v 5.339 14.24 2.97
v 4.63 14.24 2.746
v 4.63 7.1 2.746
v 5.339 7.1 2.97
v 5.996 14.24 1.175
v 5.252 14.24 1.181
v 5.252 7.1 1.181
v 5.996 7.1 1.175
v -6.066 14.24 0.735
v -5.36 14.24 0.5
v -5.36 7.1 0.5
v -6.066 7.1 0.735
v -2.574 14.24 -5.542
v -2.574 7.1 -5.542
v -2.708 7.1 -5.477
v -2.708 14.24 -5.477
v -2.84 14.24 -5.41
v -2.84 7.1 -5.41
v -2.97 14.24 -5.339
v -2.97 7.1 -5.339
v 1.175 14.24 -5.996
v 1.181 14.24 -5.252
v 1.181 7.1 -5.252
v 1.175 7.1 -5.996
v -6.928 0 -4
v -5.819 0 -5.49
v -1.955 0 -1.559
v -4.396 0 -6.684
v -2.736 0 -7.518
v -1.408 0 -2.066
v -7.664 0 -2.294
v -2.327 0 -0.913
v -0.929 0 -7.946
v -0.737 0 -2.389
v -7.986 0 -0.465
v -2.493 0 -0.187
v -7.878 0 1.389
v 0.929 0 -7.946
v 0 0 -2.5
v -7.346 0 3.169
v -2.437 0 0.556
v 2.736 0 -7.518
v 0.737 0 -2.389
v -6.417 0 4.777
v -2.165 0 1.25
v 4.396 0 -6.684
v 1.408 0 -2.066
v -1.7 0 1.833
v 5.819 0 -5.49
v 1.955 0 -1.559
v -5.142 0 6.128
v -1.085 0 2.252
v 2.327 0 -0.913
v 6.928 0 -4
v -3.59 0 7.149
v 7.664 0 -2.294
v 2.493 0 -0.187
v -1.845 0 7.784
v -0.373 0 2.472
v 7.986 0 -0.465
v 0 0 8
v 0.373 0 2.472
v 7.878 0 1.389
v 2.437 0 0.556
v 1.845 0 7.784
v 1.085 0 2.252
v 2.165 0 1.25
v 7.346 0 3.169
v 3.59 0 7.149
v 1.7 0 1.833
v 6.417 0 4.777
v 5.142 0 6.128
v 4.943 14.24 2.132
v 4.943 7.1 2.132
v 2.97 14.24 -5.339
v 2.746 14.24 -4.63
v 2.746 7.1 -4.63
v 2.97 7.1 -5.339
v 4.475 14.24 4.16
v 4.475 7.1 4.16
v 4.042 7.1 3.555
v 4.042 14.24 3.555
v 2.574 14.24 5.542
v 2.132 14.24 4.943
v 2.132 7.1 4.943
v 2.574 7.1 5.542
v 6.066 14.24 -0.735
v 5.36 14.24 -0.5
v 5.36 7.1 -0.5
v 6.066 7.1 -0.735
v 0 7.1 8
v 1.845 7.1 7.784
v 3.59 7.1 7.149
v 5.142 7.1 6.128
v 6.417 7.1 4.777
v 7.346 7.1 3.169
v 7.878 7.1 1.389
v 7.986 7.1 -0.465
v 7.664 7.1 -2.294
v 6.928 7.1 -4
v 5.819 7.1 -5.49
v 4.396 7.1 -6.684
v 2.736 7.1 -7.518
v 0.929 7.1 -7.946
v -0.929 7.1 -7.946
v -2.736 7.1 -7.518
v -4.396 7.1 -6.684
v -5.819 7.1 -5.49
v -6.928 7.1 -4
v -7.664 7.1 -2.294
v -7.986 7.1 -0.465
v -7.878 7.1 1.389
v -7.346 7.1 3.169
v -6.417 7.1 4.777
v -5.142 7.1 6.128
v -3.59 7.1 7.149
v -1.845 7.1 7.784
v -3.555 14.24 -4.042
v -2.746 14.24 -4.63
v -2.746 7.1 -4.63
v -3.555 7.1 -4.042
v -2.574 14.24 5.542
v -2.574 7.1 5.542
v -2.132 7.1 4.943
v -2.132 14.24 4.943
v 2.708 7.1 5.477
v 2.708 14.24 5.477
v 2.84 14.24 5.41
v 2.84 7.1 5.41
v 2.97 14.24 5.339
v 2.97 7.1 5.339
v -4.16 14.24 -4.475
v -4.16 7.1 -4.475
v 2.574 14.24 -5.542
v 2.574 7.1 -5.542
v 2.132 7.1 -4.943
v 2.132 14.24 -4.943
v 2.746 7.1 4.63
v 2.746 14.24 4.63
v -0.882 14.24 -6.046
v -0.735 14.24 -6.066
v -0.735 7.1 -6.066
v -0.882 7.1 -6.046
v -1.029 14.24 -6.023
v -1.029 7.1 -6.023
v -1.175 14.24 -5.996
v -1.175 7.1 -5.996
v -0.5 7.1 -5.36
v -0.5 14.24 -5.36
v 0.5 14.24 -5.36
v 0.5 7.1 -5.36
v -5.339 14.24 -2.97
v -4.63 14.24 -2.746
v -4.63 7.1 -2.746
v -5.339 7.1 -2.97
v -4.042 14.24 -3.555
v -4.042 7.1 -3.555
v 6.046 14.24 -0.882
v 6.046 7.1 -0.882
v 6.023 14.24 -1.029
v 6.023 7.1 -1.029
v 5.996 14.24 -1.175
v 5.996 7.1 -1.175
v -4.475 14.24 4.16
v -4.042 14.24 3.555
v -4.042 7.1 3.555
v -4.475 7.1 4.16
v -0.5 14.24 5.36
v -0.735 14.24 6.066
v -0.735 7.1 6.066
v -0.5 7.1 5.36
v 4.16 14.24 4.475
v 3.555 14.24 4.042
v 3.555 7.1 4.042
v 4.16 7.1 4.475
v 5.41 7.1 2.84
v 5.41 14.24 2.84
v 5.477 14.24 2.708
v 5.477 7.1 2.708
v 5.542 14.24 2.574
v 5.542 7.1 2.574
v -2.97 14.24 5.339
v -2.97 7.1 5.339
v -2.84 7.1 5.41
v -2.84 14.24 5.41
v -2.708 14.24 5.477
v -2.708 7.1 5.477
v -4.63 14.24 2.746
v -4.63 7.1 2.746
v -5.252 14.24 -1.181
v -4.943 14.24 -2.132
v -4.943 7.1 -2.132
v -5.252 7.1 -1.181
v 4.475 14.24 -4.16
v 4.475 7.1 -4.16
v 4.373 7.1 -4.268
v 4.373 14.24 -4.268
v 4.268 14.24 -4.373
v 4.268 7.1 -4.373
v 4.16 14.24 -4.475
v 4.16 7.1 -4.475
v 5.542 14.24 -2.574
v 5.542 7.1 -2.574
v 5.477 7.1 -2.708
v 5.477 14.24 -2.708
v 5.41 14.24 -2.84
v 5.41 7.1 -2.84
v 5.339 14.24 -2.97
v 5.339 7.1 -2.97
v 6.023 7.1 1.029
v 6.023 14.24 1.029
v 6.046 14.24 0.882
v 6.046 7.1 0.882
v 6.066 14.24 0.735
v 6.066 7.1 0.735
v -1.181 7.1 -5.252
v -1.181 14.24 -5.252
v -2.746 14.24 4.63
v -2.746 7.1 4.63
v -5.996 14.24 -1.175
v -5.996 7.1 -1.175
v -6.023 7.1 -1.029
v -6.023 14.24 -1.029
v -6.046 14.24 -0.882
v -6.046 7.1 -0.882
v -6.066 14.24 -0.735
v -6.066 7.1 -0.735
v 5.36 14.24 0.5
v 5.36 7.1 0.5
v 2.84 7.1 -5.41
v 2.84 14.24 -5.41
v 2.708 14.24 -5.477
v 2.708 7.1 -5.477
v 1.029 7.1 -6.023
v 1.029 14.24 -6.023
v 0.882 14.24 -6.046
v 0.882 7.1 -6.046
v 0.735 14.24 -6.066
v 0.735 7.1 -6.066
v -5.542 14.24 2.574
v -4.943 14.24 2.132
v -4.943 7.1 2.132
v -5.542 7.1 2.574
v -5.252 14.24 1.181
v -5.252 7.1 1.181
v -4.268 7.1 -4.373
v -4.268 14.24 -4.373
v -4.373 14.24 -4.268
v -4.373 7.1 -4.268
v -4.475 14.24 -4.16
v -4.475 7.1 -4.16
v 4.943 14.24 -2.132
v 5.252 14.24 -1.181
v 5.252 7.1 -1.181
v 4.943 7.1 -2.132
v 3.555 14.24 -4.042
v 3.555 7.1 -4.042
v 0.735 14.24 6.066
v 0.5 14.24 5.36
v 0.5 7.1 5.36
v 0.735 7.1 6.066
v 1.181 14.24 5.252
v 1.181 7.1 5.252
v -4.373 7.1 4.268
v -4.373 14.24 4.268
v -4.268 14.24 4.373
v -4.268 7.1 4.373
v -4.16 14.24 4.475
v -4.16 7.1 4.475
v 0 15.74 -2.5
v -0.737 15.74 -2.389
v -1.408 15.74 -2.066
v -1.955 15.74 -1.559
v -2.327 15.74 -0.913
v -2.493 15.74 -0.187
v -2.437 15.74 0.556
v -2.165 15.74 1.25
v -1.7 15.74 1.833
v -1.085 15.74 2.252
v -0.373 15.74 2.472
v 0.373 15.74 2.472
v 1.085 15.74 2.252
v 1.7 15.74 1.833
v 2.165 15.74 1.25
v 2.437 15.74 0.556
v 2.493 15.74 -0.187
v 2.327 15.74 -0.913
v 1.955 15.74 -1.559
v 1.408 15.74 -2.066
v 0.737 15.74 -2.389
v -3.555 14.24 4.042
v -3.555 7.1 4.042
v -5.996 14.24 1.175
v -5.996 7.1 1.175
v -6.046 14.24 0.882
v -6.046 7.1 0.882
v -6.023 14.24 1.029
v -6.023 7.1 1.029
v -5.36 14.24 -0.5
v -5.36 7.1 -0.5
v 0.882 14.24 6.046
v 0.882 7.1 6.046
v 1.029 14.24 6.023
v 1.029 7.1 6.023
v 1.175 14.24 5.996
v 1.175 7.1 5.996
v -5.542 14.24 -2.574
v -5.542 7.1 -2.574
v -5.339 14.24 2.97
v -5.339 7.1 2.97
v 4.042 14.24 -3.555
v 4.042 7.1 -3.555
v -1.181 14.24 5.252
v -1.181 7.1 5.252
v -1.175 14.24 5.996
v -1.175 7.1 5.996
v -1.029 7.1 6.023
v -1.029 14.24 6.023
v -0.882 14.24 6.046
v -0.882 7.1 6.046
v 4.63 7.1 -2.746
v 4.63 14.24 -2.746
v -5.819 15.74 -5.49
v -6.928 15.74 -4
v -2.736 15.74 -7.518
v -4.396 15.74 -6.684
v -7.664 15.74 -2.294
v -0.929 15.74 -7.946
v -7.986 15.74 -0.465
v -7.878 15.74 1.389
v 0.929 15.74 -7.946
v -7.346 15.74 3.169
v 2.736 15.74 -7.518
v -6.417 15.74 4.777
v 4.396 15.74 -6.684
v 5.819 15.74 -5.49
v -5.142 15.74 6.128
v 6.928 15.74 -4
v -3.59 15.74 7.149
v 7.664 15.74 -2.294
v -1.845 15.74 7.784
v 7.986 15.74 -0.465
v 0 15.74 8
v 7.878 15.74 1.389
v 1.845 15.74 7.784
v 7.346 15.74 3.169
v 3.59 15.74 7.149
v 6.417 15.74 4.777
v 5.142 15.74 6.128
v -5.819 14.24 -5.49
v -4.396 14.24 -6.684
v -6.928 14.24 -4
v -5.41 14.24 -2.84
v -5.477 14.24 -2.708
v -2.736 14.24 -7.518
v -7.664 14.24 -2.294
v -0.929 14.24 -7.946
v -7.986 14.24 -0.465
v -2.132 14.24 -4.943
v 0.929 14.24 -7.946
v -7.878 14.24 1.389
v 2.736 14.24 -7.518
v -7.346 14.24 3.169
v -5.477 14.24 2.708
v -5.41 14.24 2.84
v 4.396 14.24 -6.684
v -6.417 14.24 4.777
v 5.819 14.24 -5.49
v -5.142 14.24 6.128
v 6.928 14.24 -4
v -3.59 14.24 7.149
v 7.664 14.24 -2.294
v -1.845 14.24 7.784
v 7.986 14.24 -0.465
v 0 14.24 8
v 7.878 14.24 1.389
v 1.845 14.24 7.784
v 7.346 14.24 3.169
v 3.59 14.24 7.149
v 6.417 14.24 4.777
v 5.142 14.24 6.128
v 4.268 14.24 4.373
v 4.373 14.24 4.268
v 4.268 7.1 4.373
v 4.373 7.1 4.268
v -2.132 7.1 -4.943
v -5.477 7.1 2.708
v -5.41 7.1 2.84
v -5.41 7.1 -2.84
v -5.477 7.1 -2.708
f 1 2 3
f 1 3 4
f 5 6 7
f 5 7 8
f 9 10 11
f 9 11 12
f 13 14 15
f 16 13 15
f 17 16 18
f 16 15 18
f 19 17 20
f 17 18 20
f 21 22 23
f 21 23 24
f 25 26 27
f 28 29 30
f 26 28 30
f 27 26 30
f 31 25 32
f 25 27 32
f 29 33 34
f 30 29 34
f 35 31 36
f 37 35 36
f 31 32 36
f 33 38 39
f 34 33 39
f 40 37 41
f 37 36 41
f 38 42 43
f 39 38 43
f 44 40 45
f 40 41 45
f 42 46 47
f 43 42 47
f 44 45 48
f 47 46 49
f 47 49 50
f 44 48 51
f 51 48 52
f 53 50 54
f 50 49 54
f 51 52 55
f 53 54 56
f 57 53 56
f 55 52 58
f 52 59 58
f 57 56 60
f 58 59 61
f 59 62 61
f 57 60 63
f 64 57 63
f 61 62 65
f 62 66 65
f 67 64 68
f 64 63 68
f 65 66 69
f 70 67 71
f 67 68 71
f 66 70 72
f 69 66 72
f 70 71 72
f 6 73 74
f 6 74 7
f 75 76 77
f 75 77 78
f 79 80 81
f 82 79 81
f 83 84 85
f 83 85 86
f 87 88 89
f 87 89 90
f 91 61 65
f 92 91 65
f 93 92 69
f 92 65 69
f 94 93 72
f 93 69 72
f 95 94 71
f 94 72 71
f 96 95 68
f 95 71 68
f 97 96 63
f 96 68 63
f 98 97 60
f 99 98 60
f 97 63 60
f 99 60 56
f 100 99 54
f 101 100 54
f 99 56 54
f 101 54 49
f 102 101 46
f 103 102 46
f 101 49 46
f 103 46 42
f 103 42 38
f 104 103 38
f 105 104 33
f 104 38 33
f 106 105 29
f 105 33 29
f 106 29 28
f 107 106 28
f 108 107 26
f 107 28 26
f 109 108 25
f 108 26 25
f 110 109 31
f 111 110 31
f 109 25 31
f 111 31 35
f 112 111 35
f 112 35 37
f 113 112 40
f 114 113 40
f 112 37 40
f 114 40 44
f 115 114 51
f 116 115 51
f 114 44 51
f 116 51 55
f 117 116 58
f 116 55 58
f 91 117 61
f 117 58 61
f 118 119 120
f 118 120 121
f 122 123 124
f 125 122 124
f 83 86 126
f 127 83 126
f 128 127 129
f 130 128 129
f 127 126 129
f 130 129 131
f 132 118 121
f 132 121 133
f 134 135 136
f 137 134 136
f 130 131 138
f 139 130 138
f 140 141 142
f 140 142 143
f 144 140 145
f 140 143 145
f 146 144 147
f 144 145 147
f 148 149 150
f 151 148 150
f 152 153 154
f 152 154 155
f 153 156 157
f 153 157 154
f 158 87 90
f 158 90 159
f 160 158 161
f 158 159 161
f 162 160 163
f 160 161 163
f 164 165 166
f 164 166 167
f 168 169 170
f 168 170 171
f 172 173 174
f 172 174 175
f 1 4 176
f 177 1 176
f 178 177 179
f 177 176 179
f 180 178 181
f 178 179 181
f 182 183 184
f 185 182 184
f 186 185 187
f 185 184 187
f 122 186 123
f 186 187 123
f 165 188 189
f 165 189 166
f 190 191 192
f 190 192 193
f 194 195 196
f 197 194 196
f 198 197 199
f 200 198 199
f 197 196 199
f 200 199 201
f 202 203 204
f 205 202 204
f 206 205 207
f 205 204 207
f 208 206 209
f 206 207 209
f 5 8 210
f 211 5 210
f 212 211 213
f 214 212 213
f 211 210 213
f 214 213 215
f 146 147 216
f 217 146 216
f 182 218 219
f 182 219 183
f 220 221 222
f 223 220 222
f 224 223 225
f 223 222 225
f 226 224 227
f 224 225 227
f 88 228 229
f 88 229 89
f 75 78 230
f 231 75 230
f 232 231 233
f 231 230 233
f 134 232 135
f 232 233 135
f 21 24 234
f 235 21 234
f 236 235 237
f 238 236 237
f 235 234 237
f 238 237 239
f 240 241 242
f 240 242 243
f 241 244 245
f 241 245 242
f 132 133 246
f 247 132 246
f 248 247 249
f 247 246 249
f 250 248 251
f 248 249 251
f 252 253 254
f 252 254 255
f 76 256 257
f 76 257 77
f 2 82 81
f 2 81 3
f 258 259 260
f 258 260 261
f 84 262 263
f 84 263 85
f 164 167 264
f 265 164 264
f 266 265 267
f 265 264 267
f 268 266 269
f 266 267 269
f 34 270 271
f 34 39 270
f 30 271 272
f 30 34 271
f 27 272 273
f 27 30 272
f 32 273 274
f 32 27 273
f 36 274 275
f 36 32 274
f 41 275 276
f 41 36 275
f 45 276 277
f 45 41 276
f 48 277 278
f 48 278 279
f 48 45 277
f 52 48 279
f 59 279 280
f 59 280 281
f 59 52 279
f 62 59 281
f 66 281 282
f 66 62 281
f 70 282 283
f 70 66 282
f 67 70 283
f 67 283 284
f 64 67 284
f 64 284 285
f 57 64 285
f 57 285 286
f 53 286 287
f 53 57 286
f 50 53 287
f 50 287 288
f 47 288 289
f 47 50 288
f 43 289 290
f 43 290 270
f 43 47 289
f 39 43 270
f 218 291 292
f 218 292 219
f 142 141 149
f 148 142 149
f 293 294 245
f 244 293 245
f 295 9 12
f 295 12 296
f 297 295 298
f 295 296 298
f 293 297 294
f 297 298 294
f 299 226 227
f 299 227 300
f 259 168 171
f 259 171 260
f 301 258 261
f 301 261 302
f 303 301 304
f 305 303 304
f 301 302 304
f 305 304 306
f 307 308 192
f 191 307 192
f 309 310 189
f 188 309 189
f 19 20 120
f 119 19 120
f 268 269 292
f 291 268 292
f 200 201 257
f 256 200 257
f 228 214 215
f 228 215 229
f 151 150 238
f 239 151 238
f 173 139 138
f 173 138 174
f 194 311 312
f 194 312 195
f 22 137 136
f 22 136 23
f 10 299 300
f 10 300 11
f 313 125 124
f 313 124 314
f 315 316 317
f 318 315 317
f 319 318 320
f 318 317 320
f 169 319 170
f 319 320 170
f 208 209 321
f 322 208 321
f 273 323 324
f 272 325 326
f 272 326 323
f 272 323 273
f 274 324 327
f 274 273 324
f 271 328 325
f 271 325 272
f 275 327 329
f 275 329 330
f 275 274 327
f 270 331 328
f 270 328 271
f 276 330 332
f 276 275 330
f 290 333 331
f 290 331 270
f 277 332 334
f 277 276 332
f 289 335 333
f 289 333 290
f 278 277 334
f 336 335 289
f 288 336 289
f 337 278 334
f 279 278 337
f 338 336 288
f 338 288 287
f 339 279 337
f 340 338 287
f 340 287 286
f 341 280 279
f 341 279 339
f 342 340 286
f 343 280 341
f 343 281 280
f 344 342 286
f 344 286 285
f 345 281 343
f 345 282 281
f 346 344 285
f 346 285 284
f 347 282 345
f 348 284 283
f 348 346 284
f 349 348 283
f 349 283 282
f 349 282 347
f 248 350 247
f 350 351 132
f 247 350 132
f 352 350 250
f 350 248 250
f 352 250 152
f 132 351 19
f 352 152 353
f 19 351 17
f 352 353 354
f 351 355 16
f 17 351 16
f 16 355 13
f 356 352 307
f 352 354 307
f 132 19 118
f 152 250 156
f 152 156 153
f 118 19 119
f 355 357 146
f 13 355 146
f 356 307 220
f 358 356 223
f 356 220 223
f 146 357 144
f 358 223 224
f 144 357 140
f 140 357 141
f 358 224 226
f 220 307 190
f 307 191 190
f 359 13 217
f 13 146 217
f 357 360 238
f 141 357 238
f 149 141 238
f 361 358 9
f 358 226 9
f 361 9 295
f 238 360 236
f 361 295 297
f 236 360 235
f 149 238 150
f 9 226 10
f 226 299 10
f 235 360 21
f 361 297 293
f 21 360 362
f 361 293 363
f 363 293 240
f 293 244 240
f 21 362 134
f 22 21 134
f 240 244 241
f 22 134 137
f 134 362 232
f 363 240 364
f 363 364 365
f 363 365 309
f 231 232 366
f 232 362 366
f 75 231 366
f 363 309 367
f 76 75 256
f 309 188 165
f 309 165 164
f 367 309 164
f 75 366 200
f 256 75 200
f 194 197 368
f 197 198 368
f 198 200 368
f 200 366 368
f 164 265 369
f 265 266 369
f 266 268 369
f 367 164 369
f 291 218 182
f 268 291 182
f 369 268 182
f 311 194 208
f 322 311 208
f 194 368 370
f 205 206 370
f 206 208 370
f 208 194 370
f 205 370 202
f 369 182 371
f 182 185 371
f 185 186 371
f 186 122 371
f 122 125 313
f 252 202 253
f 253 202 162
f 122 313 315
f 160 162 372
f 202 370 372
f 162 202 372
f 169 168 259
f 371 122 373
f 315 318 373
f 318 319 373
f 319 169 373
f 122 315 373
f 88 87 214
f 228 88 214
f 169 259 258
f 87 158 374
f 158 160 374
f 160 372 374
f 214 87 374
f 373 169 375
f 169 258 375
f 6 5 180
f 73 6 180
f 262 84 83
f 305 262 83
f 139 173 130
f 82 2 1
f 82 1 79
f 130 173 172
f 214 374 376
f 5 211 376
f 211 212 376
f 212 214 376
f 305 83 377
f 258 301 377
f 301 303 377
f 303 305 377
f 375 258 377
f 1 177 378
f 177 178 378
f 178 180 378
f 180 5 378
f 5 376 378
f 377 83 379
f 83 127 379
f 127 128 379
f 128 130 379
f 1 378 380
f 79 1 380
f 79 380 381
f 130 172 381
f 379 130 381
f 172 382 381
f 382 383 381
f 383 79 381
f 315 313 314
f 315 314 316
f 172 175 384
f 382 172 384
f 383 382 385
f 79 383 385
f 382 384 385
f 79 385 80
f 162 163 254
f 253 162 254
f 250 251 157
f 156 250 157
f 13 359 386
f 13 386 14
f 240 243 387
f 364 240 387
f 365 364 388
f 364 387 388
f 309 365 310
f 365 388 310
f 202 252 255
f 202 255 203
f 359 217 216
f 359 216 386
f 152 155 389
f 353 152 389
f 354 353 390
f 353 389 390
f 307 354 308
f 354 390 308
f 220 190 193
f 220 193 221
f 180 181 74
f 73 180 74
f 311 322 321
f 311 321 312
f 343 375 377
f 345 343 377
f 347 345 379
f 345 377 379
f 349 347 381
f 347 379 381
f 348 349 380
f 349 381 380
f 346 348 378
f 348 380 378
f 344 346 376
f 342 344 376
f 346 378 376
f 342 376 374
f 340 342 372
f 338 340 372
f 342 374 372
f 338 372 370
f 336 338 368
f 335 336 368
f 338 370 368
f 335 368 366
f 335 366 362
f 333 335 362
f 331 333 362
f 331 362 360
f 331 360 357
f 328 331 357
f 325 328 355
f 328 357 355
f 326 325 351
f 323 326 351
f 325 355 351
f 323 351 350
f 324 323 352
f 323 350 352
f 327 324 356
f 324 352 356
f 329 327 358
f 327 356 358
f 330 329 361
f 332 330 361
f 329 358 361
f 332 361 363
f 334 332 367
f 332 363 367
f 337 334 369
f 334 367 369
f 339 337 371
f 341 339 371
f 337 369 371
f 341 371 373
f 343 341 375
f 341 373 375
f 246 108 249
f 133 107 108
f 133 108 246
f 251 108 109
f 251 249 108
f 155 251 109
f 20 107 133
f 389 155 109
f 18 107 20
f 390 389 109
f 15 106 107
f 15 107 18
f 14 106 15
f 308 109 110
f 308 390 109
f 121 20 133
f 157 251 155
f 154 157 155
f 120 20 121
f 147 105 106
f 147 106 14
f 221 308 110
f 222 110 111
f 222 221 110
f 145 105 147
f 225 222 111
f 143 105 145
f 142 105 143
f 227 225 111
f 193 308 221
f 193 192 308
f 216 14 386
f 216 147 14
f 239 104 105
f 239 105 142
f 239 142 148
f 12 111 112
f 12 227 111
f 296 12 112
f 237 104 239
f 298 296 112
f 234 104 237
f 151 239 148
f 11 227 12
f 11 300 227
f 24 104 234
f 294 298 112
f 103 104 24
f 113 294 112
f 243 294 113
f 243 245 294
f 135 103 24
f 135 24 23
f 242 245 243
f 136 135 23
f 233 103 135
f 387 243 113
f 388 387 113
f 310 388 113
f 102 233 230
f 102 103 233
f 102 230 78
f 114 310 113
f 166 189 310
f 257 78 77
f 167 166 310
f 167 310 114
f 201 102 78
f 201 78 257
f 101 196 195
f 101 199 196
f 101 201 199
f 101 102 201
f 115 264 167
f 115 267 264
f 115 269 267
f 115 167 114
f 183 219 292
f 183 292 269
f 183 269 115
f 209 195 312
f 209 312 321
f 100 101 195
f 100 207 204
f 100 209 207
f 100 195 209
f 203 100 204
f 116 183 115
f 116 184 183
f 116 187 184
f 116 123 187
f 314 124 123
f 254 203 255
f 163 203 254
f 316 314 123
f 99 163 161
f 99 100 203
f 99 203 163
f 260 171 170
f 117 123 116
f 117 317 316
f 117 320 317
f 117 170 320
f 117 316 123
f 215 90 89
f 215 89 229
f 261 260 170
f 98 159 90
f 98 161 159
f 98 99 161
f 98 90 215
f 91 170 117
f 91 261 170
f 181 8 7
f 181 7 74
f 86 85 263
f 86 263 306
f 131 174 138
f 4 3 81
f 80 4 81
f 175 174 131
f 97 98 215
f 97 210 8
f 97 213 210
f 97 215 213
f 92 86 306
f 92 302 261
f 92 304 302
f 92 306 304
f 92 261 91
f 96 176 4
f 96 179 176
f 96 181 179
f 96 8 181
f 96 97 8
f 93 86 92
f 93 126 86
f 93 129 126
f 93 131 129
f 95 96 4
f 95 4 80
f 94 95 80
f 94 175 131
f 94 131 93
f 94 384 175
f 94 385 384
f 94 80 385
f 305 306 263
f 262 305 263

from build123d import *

# Parameters (mm, degrees)
SKETCH1_R           = 8
BOSS_EXTRUDE1_DEPTH = 7.1
SKETCH2_R           = 6.11
BOSS_EXTRUDE2_DEPTH = 7.14
SKETCH5_R           = 2.5
CUT_EXTRUDE2_DEPTH  = 16
CUT_EXTRUDE3_DEPTH  = 7.14
SKETCH8_R           = 8
BOSS_EXTRUDE4_DEPTH = 1.5
CUT_EXTRUDE4_START  = -15.74
SKETCH9_R           = 2.5
CUT_EXTRUDE4_DEPTH  = 15.74


with BuildPart() as part:
    # Sketch1 → Boss-Extrude1 (new body)
    with BuildSketch(Plane(origin=(0, 0, 0), x_dir=(1, 0, 0), z_dir=(0, 1, 0))):
        with Locations(Location((0, 0, 0), (0, 0, 270))):
            Circle(SKETCH1_R)
    extrude(amount=BOSS_EXTRUDE1_DEPTH)

    # Sketch2 → Boss-Extrude2 (add)
    with BuildSketch(Plane(origin=(0, 7.1, 0), x_dir=(1, 0, 0), z_dir=(0, 1, 0))):
        with Locations(Location((0, 0, 0), (0, 0, 270))):
            Circle(SKETCH2_R)
    extrude(amount=BOSS_EXTRUDE2_DEPTH)

    # Sketch5 → Cut-Extrude2 (cut)
    with BuildSketch(Plane.XZ):
        with Locations(Location((0, 0, 0), (0, 0, 270))):
            Circle(SKETCH5_R)
    extrude(amount=-CUT_EXTRUDE2_DEPTH, mode=Mode.SUBTRACT)

    # Sketch7 → Cut-Extrude3 (cut)
    with BuildSketch(Plane(origin=(0, 14.24, 0), x_dir=(1, 0, 0), z_dir=(0, 1, 0))):
        Polygon((-0.5, 5.36), (0.5, 5.36), (1, 6.86), (-1, 6.86), align=None)
        Polygon((3.070913098, 6.215230707), (2.131859348, 4.94315443), (1.180802832, 5.252171425), (1.168800065, 6.833264696), align=None)
        Polygon((4.841223825, 4.962071329), (3.555037449, 4.042438464), (2.746020455, 4.630223716), (3.223189836, 6.137641834), align=None)
        Polygon((6.137641834, 3.223189836), (4.630223716, 2.746020455), (4.042438464, 3.555037449), (4.962071329, 4.841223825), align=None)
        Polygon((6.833264696, 1.168800065), (5.252171425, 1.180802832), (4.94315443, 2.131859348), (6.215230707, 3.070913098), align=None)
        Polygon((6.86, -1), (5.36, -0.5), (5.36, 0.5), (6.86, 1), align=None)
        Polygon((6.215230707, -3.070913098), (4.94315443, -2.131859348), (5.252171425, -1.180802832), (6.833264696, -1.168800065), align=None)
        Polygon((4.962071329, -4.841223825), (4.042438464, -3.555037449), (4.630223716, -2.746020455), (6.137641834, -3.223189836), align=None)
        Polygon((3.223189836, -6.137641834), (2.746020455, -4.630223716), (3.555037449, -4.042438464), (4.841223825, -4.962071329), align=None)
        Polygon((1.168800065, -6.833264696), (1.180802832, -5.252171425), (2.131859348, -4.94315443), (3.070913098, -6.215230707), align=None)
        Polygon((-1, -6.86), (-0.5, -5.36), (0.5, -5.36), (1, -6.86), align=None)
        Polygon((-3.070913098, -6.215230707), (-2.131859348, -4.94315443), (-1.180802832, -5.252171425), (-1.168800065, -6.833264696), align=None)
        Polygon((-4.841223825, -4.962071329), (-3.555037449, -4.042438464), (-2.746020455, -4.630223716), (-3.223189836, -6.137641834), align=None)
        Polygon((-6.137641834, -3.223189836), (-4.630223716, -2.746020455), (-4.042438464, -3.555037449), (-4.962071329, -4.841223825), align=None)
        Polygon((-6.833264696, -1.168800065), (-5.252171425, -1.180802832), (-4.94315443, -2.131859348), (-6.215230707, -3.070913098), align=None)
        Polygon((-6.86, 1), (-5.36, 0.5), (-5.36, -0.5), (-6.86, -1), align=None)
        Polygon((-6.215230707, 3.070913098), (-4.94315443, 2.131859348), (-5.252171425, 1.180802832), (-6.833264696, 1.168800065), align=None)
        Polygon((-4.962071329, 4.841223825), (-4.042438464, 3.555037449), (-4.630223716, 2.746020455), (-6.137641834, 3.223189836), align=None)
        Polygon((-3.223189836, 6.137641834), (-2.746020455, 4.630223716), (-3.555037449, 4.042438464), (-4.841223825, 4.962071329), align=None)
        Polygon((-1.168800065, 6.833264696), (-1.180802832, 5.252171425), (-2.131859348, 4.94315443), (-3.070913098, 6.215230707), align=None)
    extrude(amount=-CUT_EXTRUDE3_DEPTH, mode=Mode.SUBTRACT)

    # Sketch8 → Boss-Extrude4 (add)
    with BuildSketch(Plane(origin=(0, 14.24, 0), x_dir=(1, 0, 0), z_dir=(0, 1, 0))):
        with Locations(Location((0, 0, 0), (0, 0, 270))):
            Circle(SKETCH8_R)
    extrude(amount=BOSS_EXTRUDE4_DEPTH)

    # Sketch9 → Cut-Extrude4 (cut)
    with BuildSketch(Plane(origin=(0, 15.74, 0), x_dir=(1, 0, 0), z_dir=(0, 1, 0)).offset(CUT_EXTRUDE4_START)):
        with Locations(Location((0, 0, 0), (0, 0, 90))):
            Circle(SKETCH9_R)
    extrude(amount=CUT_EXTRUDE4_DEPTH, mode=Mode.SUBTRACT)


solid = part.part
